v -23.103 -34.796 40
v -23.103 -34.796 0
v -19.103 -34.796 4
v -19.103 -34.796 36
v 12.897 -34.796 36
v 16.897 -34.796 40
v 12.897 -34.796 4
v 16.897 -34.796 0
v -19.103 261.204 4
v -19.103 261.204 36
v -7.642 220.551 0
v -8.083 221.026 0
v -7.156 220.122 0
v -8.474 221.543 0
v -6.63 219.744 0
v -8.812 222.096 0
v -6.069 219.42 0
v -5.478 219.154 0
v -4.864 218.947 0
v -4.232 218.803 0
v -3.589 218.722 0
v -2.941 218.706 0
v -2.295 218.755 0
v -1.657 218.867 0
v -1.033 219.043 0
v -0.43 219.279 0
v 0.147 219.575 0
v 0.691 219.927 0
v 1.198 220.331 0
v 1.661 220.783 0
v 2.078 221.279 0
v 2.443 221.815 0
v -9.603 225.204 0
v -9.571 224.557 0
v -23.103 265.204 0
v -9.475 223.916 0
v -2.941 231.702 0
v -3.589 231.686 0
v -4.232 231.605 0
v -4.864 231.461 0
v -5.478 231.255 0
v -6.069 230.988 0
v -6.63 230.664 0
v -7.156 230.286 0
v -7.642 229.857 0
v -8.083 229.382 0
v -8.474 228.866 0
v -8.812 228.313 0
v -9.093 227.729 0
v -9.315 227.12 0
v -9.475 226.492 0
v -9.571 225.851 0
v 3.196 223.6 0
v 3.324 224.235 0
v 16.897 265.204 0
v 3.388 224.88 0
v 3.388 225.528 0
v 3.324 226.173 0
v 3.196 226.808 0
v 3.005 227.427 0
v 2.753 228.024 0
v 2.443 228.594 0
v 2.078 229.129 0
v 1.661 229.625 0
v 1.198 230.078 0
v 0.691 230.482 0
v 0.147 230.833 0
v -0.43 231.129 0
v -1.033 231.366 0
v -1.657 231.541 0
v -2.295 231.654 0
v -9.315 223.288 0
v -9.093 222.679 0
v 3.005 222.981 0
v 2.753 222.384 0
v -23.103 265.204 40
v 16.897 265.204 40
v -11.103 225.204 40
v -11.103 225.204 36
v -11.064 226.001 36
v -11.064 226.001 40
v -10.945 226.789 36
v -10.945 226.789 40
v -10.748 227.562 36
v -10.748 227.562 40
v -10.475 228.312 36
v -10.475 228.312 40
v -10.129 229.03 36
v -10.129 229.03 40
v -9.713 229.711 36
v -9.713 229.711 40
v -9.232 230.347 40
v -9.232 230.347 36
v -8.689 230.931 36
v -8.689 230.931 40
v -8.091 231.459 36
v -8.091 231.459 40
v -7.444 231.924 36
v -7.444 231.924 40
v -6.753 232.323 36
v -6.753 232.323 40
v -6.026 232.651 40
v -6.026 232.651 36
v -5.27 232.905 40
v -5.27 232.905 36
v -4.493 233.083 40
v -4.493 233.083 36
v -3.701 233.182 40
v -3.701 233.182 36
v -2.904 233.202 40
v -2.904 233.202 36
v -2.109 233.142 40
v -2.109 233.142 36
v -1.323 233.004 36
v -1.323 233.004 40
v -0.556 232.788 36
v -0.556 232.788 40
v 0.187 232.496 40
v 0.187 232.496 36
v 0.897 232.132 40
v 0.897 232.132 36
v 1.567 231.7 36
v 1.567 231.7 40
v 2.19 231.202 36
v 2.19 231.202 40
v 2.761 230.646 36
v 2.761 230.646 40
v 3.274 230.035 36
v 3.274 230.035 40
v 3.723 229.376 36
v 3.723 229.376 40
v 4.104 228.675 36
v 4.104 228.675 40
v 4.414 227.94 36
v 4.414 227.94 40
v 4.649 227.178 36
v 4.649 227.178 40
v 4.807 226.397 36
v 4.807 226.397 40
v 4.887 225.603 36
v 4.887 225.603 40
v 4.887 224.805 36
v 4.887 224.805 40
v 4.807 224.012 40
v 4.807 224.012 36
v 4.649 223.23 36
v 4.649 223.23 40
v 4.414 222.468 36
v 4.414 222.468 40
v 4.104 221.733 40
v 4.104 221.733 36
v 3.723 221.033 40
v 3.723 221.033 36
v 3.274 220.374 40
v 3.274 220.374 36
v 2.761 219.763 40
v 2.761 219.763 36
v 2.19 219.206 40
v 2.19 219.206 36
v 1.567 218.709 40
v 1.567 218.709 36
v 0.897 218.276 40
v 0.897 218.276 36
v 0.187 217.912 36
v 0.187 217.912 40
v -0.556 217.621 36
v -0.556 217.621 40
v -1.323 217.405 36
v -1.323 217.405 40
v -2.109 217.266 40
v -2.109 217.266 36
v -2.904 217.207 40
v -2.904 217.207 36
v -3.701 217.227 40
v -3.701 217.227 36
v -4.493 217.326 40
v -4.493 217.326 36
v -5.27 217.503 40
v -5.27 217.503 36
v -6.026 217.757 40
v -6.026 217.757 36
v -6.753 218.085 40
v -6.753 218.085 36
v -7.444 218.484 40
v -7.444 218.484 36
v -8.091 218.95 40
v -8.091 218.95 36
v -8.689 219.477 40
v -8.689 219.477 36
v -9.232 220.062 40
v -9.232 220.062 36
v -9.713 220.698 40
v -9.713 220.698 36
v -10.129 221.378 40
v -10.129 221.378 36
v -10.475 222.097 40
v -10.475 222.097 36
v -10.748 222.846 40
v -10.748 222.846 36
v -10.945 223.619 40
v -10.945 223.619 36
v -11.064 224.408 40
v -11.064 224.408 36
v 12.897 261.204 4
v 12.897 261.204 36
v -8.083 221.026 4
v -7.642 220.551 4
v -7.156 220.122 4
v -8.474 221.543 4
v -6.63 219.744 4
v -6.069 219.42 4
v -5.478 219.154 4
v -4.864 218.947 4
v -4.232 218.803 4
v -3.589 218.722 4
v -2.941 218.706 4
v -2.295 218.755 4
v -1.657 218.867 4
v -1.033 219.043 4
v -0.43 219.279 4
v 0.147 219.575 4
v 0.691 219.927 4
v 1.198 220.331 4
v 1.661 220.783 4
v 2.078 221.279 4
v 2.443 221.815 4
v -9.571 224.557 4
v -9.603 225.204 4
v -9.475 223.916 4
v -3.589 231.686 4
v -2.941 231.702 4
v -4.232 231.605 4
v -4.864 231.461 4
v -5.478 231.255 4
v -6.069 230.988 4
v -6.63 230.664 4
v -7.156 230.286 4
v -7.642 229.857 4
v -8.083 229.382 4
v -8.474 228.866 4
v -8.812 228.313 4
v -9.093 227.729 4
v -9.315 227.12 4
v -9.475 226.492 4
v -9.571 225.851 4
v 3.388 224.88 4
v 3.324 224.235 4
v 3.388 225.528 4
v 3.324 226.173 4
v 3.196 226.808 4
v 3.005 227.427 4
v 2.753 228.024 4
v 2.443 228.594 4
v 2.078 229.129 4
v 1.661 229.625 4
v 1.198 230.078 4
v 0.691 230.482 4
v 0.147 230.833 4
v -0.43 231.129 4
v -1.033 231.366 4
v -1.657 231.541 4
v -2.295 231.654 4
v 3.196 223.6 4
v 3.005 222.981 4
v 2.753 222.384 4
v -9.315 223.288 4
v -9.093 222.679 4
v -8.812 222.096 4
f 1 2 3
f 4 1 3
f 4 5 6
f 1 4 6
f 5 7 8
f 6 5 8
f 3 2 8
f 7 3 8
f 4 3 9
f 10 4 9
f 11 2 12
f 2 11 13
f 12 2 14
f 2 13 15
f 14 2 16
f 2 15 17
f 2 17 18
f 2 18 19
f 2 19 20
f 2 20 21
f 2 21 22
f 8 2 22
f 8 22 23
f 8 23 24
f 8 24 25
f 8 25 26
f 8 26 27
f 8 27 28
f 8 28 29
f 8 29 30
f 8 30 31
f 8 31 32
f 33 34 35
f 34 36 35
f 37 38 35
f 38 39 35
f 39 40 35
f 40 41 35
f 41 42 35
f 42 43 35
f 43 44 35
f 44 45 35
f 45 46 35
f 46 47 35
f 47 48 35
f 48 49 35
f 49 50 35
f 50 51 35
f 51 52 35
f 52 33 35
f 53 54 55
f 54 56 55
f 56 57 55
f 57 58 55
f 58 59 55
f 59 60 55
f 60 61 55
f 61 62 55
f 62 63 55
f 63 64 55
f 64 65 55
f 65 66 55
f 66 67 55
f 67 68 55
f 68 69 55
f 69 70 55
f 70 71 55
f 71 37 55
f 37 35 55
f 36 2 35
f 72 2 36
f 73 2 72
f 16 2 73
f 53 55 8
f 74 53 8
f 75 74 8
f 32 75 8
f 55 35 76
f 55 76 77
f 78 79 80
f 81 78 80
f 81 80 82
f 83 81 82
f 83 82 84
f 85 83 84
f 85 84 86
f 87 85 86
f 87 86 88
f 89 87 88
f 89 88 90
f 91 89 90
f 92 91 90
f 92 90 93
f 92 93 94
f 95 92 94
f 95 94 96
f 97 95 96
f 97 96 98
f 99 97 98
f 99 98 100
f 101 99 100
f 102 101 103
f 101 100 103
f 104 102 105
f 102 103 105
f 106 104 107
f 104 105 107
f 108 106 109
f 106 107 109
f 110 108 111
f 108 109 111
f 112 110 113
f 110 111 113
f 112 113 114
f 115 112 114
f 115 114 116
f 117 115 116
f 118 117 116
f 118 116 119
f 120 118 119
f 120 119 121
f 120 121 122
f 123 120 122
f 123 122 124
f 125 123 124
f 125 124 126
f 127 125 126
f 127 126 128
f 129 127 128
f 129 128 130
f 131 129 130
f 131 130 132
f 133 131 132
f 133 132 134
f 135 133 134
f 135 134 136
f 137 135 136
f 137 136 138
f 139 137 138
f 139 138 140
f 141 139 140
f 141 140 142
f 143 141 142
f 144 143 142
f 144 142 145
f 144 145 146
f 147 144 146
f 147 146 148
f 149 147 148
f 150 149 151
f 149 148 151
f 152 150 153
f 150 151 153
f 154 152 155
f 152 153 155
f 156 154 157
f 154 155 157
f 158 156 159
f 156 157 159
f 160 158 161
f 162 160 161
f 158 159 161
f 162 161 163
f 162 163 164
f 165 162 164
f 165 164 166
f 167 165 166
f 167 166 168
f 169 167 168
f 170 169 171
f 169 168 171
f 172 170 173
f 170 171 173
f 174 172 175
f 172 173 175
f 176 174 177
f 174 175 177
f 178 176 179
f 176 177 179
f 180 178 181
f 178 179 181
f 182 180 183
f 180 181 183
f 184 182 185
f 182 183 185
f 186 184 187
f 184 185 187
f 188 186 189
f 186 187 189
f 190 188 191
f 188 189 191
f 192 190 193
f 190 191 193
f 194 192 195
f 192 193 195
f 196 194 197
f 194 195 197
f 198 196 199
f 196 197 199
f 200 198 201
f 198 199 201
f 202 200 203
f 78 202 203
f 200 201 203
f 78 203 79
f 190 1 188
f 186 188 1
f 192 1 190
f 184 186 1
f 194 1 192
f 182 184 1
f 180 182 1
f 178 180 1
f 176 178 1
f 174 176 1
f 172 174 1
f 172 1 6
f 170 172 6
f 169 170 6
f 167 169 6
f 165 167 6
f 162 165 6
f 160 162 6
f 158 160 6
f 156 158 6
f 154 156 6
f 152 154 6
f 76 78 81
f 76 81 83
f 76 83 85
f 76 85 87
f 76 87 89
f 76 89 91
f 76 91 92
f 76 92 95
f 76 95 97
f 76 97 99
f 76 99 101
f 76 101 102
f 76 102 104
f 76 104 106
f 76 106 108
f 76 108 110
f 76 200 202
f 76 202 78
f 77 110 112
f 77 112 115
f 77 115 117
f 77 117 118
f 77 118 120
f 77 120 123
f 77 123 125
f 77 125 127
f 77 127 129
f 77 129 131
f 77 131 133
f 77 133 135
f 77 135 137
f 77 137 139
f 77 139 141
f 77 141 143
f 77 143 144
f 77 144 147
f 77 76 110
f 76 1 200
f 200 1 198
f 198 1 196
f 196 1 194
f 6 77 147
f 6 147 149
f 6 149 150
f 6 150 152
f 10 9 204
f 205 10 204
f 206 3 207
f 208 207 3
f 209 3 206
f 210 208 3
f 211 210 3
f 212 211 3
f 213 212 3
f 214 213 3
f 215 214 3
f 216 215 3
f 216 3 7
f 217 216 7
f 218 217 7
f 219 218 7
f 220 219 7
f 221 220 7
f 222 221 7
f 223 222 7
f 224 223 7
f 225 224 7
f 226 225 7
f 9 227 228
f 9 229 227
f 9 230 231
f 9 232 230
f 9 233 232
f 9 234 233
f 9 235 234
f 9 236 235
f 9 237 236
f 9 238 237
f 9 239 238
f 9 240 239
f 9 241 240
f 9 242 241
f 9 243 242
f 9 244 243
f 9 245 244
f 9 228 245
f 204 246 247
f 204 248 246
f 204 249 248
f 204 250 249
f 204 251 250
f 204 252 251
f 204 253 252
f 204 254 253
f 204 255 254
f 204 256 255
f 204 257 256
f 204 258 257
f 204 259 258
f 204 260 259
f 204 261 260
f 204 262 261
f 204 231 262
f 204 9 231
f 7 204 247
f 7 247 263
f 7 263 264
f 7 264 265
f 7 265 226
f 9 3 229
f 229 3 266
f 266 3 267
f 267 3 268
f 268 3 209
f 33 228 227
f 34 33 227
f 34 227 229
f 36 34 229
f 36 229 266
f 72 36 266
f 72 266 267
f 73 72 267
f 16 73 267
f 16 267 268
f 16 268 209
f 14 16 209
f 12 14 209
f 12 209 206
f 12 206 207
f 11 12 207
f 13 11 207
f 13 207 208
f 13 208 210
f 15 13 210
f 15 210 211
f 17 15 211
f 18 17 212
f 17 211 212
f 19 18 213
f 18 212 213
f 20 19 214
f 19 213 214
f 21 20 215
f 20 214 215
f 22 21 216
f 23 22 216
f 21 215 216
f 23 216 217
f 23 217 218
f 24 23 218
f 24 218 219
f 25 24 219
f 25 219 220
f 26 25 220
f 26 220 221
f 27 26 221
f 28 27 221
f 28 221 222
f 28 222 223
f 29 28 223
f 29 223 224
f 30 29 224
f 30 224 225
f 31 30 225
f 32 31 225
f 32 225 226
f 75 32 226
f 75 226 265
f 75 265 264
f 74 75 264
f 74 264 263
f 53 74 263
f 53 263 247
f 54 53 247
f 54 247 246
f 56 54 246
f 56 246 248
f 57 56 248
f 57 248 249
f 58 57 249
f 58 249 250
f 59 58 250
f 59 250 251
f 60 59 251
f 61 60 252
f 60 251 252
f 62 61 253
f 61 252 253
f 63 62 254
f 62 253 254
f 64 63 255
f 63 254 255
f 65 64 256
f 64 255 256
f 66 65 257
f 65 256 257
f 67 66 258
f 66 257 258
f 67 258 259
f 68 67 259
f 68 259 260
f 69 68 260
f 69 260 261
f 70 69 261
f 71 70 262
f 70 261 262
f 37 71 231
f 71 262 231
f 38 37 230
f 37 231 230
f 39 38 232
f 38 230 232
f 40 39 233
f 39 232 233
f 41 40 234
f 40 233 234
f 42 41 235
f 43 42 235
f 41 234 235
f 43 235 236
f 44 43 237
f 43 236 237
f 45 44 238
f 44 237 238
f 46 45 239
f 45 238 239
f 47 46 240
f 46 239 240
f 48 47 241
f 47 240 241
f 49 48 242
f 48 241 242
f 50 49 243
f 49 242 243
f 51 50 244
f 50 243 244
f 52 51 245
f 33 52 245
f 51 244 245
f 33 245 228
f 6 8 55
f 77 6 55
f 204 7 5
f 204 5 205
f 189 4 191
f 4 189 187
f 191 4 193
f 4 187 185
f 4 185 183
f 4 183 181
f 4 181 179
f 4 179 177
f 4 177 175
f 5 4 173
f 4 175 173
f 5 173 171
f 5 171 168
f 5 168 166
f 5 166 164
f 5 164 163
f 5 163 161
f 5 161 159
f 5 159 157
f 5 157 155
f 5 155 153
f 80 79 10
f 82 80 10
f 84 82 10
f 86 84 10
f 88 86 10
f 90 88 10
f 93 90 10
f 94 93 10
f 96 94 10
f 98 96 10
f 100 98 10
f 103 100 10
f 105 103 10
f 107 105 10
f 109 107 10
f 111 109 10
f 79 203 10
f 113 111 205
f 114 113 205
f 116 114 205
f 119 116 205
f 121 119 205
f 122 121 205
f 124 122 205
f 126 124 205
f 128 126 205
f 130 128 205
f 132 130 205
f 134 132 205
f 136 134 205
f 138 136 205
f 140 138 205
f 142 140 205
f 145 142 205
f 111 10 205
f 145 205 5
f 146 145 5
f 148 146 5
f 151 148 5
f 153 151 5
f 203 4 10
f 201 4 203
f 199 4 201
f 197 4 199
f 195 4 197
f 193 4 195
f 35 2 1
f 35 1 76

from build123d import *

# Parameters (mm, degrees)
F0_W     = 40
F0_H     = 300
F1_DEPTH = 40
F2_T     = -4
F4_D     = 16
F4_DEPTH = 4
F6_D     = 13
F6_DEPTH = 4


with BuildPart() as f1:
    # F0 (on Top) → F1 (new body)
    with BuildSketch(Plane.XY):
        with Locations((-3.103449, 115.204206)):
            Rectangle(F0_W, F0_H)
    extrude(amount=F1_DEPTH)

    # F2
    f2_openings = [f1.faces().sort_by_distance(p)[0] for p in [
        (-3.103449, -34.795794, 20),
    ]]
    offset(amount=F2_T, openings=f2_openings)

    # F4
    with Locations(Plane.XY.offset(40)):
        with Locations((-3.103449, 225.204206)):
            Hole(F4_D / 2, depth=F4_DEPTH)

    # F6
    with Locations(Plane(origin=(0, 0, 0), x_dir=(1, 0, 0), z_dir=(0, 0, -1))):
        with Locations((-3.103449, -225.204206)):
            Hole(F6_D / 2, depth=F6_DEPTH)


solid = f1.part
